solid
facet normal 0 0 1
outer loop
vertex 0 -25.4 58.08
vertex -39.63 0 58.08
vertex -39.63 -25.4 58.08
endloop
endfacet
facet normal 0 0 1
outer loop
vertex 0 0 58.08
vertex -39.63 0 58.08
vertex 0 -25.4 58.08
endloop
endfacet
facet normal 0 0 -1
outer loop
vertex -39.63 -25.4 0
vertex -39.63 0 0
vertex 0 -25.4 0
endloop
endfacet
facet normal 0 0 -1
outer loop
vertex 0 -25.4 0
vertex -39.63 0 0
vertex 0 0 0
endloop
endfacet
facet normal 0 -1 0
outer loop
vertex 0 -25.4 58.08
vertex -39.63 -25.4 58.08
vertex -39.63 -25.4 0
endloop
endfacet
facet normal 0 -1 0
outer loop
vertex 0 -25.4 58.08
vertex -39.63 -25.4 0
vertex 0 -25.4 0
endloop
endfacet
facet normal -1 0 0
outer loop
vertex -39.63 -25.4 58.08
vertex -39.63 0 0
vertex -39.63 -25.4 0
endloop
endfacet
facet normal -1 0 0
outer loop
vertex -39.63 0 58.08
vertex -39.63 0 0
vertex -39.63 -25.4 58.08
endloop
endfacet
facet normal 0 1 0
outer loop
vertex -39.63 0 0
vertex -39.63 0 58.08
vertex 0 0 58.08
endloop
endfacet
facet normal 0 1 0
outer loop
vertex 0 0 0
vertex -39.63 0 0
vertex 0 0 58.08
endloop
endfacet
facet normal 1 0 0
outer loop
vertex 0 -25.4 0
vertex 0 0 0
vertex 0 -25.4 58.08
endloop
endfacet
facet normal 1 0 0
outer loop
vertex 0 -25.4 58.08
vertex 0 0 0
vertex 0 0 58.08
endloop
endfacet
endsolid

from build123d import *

# Parameters (mm, degrees)
F0_W     = 39.63
F0_H     = 58.08
F1_DEPTH = 25.4
F0_W_2   = 18.75
F0_H_2   = 48.9571709186


with BuildPart() as f1:
    # F0 (on Front) → F1 (new body)
    with BuildSketch(Plane.XZ):
        with Locations((-19.815, 29.04)):
            Rectangle(F0_W, F0_H)
    extrude(amount=F1_DEPTH)


with BuildPart() as f1b:
    # F0 (on Front) → F1, piece 2 (new body)
    with BuildSketch(Plane.XZ):
        with Locations((53.4364521503, -45.8798622712)):
            Rectangle(F0_W_2, F0_H_2)
    extrude(amount=F1_DEPTH)


solid = f1.part
